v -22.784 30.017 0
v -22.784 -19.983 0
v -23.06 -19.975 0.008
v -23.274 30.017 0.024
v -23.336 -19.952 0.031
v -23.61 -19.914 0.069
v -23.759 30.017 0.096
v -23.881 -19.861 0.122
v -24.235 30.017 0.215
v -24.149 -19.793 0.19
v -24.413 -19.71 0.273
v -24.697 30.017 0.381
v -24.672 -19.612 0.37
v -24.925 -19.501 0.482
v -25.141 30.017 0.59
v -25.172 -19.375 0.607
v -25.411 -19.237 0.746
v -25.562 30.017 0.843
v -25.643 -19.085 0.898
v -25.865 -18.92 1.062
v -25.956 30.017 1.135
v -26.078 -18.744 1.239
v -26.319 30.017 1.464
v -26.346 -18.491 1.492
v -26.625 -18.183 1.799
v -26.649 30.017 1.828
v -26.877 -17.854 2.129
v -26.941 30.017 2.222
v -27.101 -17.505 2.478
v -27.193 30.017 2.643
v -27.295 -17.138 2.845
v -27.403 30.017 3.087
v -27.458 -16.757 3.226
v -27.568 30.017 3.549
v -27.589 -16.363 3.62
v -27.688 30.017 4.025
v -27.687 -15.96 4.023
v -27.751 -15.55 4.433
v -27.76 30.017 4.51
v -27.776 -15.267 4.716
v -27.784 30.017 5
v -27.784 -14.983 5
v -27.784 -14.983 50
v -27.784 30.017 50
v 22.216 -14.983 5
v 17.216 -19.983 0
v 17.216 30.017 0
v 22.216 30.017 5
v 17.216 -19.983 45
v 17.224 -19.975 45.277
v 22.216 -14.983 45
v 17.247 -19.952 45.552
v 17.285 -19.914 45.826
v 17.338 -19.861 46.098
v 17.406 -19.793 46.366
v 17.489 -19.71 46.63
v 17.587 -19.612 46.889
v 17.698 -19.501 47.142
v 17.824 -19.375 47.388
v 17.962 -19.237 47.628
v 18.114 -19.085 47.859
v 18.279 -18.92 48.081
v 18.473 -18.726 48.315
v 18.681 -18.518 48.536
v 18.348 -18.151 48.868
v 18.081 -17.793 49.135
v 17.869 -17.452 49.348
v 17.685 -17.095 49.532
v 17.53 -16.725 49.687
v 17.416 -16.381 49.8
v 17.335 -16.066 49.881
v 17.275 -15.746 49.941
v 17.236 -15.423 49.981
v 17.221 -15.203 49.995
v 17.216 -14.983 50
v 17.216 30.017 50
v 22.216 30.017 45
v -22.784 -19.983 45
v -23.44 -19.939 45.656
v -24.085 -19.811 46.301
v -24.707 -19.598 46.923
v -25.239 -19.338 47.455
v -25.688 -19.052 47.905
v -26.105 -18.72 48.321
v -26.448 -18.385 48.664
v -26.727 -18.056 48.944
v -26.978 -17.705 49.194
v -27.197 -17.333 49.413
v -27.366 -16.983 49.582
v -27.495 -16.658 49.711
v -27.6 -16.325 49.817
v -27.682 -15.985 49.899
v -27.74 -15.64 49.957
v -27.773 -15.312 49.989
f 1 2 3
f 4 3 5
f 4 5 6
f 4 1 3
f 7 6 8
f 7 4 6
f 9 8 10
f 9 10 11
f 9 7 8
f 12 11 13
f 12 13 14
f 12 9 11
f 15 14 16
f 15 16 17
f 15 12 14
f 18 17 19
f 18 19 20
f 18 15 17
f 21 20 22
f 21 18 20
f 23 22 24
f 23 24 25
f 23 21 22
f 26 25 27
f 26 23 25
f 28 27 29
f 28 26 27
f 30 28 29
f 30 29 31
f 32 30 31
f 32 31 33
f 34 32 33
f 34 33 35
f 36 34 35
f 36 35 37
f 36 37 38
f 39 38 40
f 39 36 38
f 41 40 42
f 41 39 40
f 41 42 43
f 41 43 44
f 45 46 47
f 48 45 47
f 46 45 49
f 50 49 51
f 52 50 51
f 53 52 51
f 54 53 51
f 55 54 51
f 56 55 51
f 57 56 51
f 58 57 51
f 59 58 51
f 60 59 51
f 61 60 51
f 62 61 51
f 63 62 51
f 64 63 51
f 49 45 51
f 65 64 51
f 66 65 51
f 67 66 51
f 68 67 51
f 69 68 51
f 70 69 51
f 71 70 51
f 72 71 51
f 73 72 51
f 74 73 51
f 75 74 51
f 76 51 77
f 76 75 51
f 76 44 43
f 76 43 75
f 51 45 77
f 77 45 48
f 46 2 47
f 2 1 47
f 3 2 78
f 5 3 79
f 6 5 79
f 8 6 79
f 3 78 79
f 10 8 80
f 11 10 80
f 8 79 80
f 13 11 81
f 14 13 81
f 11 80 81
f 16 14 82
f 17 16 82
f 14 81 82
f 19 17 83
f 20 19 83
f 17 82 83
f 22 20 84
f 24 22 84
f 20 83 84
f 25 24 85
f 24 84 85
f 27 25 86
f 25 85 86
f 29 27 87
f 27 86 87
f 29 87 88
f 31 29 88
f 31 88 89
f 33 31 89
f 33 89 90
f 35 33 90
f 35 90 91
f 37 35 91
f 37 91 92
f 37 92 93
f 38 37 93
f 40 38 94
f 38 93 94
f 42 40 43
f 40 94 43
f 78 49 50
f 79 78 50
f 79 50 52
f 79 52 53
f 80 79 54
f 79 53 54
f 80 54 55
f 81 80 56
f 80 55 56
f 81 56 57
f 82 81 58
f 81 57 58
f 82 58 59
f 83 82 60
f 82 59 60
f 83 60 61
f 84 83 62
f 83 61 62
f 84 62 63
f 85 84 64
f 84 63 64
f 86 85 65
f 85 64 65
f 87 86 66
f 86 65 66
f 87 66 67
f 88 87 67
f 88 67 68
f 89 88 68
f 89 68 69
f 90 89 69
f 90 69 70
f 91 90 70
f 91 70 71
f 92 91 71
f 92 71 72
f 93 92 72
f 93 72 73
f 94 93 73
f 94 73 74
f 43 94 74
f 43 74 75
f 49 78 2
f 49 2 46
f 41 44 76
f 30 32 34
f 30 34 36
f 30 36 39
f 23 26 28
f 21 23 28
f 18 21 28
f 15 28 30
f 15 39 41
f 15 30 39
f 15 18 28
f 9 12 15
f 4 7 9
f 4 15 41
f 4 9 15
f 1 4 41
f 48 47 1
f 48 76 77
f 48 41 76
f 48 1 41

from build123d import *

# Parameters (mm, degrees)
F0_W     = 50
F0_H     = 50
F1_DEPTH = 50
F2_SIZE  = 5
F3_R     = 5


with BuildPart() as f1:
    # F0 (on Top) → F1 (new body)
    with BuildSketch(Plane.XY):
        with Locations((-2.783662, 5.017282)):
            Rectangle(F0_W, F0_H)
    extrude(amount=F1_DEPTH)

    # F2
    f2_edges = [f1.edges().sort_by_distance(p)[0] for p in [
        (22.216338, 5.017282, 50),
        (22.216338, -19.982718, 25),
        (22.216338, 5.017282, 0),
    ]]
    chamfer(f2_edges, length=F2_SIZE)

    # F3
    f3_edges = [f1.edges().sort_by_distance(p)[0] for p in [
        (-5.283662, -19.982718, 50),
        (-27.783662, -19.982718, 25),
        (-27.783662, 5.017282, 0),
    ]]
    fillet(f3_edges, radius=F3_R)


solid = f1.part
